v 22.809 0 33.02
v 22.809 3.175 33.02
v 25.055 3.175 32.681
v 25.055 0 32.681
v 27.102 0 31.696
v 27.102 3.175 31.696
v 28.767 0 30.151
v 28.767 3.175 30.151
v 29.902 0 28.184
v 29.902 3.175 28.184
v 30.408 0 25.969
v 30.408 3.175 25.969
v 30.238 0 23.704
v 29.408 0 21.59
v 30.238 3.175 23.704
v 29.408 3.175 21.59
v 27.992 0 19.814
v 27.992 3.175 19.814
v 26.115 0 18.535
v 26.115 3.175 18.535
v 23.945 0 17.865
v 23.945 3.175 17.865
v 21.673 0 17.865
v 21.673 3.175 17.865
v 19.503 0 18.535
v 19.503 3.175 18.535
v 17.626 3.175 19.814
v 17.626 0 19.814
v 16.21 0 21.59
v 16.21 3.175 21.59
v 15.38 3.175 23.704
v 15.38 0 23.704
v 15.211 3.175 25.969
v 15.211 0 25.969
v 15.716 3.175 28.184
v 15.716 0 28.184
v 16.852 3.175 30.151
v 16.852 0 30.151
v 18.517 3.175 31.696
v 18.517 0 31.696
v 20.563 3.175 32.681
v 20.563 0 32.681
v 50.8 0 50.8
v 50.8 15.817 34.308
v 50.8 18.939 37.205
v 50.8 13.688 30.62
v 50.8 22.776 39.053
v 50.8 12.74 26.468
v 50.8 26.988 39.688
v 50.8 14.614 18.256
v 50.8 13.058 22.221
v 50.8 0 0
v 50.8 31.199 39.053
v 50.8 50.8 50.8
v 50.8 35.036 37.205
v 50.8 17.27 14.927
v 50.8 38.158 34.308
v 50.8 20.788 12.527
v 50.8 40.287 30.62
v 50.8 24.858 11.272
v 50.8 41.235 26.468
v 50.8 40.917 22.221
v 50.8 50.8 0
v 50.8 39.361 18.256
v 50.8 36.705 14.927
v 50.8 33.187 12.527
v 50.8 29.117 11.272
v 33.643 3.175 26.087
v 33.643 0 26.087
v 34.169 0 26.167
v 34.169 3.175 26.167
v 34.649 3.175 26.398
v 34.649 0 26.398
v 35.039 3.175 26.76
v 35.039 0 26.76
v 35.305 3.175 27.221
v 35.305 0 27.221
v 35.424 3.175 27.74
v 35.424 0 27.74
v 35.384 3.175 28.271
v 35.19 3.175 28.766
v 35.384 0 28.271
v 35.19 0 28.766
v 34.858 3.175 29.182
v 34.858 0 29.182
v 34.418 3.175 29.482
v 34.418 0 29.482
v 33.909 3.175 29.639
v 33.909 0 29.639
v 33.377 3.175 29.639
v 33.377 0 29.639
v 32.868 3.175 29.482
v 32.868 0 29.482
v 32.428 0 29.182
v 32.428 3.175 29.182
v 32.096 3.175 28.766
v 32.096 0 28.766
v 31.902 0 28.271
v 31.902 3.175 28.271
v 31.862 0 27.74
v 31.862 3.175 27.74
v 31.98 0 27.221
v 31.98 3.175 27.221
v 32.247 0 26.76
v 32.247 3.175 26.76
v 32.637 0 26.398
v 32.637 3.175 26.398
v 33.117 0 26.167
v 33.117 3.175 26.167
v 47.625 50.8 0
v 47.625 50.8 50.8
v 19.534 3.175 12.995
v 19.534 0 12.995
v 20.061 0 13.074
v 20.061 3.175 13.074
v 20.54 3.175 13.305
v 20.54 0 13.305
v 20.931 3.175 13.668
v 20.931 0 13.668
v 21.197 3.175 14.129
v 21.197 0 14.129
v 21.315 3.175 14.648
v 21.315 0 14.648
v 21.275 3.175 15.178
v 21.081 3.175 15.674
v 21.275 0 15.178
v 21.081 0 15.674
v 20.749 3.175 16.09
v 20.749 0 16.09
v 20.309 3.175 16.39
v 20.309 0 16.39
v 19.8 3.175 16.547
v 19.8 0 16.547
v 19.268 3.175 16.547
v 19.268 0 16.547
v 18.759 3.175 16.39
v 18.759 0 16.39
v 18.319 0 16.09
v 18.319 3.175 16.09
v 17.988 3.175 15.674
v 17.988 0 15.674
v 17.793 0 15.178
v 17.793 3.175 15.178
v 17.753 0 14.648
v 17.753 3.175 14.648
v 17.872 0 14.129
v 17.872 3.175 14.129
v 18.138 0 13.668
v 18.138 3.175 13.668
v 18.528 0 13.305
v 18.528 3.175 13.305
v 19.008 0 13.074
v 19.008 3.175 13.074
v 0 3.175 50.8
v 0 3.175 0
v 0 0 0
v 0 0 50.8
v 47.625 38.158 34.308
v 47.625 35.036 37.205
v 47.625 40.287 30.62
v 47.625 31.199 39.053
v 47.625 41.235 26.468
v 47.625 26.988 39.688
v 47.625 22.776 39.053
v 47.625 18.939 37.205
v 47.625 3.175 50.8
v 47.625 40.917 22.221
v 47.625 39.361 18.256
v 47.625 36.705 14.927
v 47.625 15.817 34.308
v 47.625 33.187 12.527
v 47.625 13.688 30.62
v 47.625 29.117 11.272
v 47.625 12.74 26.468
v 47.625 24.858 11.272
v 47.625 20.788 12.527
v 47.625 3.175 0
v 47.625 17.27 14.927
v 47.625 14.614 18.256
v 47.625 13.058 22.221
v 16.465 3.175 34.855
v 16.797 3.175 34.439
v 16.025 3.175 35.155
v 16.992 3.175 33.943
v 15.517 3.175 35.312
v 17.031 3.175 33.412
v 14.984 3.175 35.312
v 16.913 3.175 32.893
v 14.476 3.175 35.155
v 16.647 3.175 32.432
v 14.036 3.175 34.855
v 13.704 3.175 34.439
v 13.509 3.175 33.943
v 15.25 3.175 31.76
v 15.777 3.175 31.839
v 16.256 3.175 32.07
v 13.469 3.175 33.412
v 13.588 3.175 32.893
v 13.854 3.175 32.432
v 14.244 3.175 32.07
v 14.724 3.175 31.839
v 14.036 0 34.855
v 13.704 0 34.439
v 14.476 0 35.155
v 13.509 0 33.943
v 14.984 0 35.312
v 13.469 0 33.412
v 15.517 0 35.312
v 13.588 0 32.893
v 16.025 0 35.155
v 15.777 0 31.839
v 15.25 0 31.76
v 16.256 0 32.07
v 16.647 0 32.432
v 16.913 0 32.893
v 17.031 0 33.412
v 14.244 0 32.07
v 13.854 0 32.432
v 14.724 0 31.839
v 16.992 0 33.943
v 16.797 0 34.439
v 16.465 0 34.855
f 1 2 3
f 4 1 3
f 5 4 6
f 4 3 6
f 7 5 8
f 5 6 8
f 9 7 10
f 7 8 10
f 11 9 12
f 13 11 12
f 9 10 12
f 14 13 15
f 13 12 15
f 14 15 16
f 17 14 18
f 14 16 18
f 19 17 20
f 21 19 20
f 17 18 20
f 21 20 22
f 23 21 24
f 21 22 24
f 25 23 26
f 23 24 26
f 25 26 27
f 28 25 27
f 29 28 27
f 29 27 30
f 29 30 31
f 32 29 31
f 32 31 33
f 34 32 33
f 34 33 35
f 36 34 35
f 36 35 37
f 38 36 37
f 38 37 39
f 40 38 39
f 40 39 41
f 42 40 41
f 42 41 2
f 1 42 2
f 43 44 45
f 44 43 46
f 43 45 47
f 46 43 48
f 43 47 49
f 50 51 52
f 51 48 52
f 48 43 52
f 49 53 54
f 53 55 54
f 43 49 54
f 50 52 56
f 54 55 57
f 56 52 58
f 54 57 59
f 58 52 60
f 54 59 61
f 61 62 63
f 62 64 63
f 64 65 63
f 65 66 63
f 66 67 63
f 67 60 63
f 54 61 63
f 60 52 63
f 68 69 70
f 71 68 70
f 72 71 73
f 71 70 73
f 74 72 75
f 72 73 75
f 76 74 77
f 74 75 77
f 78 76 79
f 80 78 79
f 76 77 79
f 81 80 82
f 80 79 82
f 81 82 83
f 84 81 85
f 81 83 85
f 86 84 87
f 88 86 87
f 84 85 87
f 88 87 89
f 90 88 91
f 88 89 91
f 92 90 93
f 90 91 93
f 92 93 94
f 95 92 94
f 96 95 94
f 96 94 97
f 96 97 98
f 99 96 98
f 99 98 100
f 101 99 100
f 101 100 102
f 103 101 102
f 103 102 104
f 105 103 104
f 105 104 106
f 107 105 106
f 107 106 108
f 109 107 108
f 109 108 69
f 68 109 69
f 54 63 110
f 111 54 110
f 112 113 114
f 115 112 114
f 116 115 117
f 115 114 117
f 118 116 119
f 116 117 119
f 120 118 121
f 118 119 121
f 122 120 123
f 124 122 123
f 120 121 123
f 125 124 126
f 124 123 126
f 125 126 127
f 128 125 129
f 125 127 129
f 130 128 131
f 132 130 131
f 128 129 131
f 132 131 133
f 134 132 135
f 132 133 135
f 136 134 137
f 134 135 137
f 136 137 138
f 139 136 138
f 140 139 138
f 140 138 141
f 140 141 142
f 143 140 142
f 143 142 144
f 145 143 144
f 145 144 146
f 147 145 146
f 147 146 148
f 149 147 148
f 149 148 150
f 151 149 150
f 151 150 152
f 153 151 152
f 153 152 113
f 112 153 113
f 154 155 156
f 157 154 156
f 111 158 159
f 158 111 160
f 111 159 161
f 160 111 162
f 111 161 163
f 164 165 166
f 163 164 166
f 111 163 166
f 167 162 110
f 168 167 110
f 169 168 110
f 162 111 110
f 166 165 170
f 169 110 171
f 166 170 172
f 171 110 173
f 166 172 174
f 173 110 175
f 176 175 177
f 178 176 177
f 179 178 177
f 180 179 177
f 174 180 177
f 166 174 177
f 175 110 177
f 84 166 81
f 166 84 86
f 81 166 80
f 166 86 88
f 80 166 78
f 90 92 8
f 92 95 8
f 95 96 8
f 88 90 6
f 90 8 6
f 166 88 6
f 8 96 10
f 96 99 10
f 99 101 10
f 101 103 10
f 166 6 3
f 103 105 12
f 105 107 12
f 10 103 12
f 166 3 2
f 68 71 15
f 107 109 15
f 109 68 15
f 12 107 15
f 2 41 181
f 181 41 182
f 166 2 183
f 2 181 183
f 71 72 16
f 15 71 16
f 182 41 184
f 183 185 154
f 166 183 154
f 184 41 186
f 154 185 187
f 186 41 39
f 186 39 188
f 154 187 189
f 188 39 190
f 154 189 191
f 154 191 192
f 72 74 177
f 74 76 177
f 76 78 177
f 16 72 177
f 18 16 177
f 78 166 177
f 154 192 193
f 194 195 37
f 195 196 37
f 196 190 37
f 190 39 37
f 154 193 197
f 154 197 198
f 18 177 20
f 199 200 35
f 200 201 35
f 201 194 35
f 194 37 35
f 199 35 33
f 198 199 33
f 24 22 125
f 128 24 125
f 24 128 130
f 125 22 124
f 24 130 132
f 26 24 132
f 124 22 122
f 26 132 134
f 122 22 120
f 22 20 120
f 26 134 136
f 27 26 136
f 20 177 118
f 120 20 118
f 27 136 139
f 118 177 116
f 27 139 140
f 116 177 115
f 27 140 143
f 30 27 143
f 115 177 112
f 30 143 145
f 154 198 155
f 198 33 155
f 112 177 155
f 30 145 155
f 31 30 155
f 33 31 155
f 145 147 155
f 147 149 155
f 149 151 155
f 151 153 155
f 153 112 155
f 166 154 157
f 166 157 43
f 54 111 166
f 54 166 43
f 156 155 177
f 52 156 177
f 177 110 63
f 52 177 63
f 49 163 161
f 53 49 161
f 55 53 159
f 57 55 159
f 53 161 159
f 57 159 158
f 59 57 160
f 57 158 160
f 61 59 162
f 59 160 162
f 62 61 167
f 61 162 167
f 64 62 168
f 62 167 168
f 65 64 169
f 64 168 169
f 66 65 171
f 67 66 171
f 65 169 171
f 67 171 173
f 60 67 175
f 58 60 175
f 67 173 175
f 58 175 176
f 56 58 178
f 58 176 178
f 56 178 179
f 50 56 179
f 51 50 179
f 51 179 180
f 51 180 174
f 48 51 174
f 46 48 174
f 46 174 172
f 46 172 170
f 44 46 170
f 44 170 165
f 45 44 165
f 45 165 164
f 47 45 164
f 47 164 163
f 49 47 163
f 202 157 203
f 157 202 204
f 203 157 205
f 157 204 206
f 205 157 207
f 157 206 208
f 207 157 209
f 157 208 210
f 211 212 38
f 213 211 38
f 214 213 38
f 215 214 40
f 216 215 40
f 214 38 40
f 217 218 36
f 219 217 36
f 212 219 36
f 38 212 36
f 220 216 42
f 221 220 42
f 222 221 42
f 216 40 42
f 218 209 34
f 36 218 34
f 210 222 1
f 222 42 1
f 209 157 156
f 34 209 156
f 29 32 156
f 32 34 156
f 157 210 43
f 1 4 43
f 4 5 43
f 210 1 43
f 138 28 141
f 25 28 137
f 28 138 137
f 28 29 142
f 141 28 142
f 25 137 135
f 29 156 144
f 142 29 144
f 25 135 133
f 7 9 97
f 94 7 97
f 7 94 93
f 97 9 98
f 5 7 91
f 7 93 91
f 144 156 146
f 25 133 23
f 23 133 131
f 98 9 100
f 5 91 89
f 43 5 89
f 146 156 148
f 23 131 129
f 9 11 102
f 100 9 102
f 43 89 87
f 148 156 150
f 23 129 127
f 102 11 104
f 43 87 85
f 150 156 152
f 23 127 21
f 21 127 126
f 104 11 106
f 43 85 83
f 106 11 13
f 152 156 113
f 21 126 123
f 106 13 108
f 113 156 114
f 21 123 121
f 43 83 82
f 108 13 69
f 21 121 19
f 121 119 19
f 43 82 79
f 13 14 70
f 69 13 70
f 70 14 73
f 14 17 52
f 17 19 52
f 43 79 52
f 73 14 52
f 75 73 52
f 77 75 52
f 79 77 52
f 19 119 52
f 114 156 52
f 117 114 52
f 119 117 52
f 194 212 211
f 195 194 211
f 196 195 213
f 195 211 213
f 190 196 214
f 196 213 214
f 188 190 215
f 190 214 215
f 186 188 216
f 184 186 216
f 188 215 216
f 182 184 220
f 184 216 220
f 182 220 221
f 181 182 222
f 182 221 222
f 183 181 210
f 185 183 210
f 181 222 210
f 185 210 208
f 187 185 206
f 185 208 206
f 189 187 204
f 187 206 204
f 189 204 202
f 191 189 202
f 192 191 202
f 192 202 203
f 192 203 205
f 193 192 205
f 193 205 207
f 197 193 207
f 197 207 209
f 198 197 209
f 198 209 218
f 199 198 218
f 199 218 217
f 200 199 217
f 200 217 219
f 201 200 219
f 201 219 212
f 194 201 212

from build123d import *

# Parameters (mm, degrees)
BOSS_EXTRUDE1_DEPTH = 50.8
SKETCH2_R           = 14.2875
CUT_EXTRUDE1_DEPTH  = 50.8
SKETCH3_R           = 7.62
CUT_EXTRUDE2_DEPTH  = 50.8
SKETCH4_R           = 1.7859375
CUT_EXTRUDE3_DEPTH  = 12.7


with BuildPart() as part:
    # Sketch1 → Boss-Extrude1 (new body)
    with BuildSketch(Plane.XY):
        Polygon((0, 3.175), (0, 0), (47.625, 0), (50.8, 0), (50.8, 3.175), (50.8, 50.8), (47.625, 50.8), (47.625, 3.175), align=None)
    extrude(amount=BOSS_EXTRUDE1_DEPTH)

    # Sketch2 → Cut-Extrude1 (cut)
    with BuildSketch(Plane.ZY.offset(-47.625)):
        with Locations((25.4, 26.9875)):
            Circle(SKETCH2_R)
    extrude(amount=-CUT_EXTRUDE1_DEPTH, mode=Mode.SUBTRACT)

    # Sketch3 → Cut-Extrude2 (cut)
    with BuildSketch(Plane(origin=(0, 3.175, 0), x_dir=(1, 0, 0), z_dir=(0, 1, 0))):
        with Locations(Location((22.8092, -25.4, 0), (0, 0, 270))):
            Circle(SKETCH3_R)
    extrude(amount=-CUT_EXTRUDE2_DEPTH, mode=Mode.SUBTRACT)

    # Sketch4 → Cut-Extrude3 (cut)
    with BuildSketch(Plane.XZ):
        with Locations(Location((15.250391474, 33.54567799, 0), (0, 0, 270))):
            Circle(SKETCH4_R)
        with Locations(Location((19.534240193, 14.781040799, 0), (0, 0, 270))):
            Circle(SKETCH4_R)
        with Locations(Location((33.642968333, 27.873281211, 0), (0, 0, 270))):
            Circle(SKETCH4_R)
    extrude(amount=-CUT_EXTRUDE3_DEPTH, mode=Mode.SUBTRACT)


solid = part.part
